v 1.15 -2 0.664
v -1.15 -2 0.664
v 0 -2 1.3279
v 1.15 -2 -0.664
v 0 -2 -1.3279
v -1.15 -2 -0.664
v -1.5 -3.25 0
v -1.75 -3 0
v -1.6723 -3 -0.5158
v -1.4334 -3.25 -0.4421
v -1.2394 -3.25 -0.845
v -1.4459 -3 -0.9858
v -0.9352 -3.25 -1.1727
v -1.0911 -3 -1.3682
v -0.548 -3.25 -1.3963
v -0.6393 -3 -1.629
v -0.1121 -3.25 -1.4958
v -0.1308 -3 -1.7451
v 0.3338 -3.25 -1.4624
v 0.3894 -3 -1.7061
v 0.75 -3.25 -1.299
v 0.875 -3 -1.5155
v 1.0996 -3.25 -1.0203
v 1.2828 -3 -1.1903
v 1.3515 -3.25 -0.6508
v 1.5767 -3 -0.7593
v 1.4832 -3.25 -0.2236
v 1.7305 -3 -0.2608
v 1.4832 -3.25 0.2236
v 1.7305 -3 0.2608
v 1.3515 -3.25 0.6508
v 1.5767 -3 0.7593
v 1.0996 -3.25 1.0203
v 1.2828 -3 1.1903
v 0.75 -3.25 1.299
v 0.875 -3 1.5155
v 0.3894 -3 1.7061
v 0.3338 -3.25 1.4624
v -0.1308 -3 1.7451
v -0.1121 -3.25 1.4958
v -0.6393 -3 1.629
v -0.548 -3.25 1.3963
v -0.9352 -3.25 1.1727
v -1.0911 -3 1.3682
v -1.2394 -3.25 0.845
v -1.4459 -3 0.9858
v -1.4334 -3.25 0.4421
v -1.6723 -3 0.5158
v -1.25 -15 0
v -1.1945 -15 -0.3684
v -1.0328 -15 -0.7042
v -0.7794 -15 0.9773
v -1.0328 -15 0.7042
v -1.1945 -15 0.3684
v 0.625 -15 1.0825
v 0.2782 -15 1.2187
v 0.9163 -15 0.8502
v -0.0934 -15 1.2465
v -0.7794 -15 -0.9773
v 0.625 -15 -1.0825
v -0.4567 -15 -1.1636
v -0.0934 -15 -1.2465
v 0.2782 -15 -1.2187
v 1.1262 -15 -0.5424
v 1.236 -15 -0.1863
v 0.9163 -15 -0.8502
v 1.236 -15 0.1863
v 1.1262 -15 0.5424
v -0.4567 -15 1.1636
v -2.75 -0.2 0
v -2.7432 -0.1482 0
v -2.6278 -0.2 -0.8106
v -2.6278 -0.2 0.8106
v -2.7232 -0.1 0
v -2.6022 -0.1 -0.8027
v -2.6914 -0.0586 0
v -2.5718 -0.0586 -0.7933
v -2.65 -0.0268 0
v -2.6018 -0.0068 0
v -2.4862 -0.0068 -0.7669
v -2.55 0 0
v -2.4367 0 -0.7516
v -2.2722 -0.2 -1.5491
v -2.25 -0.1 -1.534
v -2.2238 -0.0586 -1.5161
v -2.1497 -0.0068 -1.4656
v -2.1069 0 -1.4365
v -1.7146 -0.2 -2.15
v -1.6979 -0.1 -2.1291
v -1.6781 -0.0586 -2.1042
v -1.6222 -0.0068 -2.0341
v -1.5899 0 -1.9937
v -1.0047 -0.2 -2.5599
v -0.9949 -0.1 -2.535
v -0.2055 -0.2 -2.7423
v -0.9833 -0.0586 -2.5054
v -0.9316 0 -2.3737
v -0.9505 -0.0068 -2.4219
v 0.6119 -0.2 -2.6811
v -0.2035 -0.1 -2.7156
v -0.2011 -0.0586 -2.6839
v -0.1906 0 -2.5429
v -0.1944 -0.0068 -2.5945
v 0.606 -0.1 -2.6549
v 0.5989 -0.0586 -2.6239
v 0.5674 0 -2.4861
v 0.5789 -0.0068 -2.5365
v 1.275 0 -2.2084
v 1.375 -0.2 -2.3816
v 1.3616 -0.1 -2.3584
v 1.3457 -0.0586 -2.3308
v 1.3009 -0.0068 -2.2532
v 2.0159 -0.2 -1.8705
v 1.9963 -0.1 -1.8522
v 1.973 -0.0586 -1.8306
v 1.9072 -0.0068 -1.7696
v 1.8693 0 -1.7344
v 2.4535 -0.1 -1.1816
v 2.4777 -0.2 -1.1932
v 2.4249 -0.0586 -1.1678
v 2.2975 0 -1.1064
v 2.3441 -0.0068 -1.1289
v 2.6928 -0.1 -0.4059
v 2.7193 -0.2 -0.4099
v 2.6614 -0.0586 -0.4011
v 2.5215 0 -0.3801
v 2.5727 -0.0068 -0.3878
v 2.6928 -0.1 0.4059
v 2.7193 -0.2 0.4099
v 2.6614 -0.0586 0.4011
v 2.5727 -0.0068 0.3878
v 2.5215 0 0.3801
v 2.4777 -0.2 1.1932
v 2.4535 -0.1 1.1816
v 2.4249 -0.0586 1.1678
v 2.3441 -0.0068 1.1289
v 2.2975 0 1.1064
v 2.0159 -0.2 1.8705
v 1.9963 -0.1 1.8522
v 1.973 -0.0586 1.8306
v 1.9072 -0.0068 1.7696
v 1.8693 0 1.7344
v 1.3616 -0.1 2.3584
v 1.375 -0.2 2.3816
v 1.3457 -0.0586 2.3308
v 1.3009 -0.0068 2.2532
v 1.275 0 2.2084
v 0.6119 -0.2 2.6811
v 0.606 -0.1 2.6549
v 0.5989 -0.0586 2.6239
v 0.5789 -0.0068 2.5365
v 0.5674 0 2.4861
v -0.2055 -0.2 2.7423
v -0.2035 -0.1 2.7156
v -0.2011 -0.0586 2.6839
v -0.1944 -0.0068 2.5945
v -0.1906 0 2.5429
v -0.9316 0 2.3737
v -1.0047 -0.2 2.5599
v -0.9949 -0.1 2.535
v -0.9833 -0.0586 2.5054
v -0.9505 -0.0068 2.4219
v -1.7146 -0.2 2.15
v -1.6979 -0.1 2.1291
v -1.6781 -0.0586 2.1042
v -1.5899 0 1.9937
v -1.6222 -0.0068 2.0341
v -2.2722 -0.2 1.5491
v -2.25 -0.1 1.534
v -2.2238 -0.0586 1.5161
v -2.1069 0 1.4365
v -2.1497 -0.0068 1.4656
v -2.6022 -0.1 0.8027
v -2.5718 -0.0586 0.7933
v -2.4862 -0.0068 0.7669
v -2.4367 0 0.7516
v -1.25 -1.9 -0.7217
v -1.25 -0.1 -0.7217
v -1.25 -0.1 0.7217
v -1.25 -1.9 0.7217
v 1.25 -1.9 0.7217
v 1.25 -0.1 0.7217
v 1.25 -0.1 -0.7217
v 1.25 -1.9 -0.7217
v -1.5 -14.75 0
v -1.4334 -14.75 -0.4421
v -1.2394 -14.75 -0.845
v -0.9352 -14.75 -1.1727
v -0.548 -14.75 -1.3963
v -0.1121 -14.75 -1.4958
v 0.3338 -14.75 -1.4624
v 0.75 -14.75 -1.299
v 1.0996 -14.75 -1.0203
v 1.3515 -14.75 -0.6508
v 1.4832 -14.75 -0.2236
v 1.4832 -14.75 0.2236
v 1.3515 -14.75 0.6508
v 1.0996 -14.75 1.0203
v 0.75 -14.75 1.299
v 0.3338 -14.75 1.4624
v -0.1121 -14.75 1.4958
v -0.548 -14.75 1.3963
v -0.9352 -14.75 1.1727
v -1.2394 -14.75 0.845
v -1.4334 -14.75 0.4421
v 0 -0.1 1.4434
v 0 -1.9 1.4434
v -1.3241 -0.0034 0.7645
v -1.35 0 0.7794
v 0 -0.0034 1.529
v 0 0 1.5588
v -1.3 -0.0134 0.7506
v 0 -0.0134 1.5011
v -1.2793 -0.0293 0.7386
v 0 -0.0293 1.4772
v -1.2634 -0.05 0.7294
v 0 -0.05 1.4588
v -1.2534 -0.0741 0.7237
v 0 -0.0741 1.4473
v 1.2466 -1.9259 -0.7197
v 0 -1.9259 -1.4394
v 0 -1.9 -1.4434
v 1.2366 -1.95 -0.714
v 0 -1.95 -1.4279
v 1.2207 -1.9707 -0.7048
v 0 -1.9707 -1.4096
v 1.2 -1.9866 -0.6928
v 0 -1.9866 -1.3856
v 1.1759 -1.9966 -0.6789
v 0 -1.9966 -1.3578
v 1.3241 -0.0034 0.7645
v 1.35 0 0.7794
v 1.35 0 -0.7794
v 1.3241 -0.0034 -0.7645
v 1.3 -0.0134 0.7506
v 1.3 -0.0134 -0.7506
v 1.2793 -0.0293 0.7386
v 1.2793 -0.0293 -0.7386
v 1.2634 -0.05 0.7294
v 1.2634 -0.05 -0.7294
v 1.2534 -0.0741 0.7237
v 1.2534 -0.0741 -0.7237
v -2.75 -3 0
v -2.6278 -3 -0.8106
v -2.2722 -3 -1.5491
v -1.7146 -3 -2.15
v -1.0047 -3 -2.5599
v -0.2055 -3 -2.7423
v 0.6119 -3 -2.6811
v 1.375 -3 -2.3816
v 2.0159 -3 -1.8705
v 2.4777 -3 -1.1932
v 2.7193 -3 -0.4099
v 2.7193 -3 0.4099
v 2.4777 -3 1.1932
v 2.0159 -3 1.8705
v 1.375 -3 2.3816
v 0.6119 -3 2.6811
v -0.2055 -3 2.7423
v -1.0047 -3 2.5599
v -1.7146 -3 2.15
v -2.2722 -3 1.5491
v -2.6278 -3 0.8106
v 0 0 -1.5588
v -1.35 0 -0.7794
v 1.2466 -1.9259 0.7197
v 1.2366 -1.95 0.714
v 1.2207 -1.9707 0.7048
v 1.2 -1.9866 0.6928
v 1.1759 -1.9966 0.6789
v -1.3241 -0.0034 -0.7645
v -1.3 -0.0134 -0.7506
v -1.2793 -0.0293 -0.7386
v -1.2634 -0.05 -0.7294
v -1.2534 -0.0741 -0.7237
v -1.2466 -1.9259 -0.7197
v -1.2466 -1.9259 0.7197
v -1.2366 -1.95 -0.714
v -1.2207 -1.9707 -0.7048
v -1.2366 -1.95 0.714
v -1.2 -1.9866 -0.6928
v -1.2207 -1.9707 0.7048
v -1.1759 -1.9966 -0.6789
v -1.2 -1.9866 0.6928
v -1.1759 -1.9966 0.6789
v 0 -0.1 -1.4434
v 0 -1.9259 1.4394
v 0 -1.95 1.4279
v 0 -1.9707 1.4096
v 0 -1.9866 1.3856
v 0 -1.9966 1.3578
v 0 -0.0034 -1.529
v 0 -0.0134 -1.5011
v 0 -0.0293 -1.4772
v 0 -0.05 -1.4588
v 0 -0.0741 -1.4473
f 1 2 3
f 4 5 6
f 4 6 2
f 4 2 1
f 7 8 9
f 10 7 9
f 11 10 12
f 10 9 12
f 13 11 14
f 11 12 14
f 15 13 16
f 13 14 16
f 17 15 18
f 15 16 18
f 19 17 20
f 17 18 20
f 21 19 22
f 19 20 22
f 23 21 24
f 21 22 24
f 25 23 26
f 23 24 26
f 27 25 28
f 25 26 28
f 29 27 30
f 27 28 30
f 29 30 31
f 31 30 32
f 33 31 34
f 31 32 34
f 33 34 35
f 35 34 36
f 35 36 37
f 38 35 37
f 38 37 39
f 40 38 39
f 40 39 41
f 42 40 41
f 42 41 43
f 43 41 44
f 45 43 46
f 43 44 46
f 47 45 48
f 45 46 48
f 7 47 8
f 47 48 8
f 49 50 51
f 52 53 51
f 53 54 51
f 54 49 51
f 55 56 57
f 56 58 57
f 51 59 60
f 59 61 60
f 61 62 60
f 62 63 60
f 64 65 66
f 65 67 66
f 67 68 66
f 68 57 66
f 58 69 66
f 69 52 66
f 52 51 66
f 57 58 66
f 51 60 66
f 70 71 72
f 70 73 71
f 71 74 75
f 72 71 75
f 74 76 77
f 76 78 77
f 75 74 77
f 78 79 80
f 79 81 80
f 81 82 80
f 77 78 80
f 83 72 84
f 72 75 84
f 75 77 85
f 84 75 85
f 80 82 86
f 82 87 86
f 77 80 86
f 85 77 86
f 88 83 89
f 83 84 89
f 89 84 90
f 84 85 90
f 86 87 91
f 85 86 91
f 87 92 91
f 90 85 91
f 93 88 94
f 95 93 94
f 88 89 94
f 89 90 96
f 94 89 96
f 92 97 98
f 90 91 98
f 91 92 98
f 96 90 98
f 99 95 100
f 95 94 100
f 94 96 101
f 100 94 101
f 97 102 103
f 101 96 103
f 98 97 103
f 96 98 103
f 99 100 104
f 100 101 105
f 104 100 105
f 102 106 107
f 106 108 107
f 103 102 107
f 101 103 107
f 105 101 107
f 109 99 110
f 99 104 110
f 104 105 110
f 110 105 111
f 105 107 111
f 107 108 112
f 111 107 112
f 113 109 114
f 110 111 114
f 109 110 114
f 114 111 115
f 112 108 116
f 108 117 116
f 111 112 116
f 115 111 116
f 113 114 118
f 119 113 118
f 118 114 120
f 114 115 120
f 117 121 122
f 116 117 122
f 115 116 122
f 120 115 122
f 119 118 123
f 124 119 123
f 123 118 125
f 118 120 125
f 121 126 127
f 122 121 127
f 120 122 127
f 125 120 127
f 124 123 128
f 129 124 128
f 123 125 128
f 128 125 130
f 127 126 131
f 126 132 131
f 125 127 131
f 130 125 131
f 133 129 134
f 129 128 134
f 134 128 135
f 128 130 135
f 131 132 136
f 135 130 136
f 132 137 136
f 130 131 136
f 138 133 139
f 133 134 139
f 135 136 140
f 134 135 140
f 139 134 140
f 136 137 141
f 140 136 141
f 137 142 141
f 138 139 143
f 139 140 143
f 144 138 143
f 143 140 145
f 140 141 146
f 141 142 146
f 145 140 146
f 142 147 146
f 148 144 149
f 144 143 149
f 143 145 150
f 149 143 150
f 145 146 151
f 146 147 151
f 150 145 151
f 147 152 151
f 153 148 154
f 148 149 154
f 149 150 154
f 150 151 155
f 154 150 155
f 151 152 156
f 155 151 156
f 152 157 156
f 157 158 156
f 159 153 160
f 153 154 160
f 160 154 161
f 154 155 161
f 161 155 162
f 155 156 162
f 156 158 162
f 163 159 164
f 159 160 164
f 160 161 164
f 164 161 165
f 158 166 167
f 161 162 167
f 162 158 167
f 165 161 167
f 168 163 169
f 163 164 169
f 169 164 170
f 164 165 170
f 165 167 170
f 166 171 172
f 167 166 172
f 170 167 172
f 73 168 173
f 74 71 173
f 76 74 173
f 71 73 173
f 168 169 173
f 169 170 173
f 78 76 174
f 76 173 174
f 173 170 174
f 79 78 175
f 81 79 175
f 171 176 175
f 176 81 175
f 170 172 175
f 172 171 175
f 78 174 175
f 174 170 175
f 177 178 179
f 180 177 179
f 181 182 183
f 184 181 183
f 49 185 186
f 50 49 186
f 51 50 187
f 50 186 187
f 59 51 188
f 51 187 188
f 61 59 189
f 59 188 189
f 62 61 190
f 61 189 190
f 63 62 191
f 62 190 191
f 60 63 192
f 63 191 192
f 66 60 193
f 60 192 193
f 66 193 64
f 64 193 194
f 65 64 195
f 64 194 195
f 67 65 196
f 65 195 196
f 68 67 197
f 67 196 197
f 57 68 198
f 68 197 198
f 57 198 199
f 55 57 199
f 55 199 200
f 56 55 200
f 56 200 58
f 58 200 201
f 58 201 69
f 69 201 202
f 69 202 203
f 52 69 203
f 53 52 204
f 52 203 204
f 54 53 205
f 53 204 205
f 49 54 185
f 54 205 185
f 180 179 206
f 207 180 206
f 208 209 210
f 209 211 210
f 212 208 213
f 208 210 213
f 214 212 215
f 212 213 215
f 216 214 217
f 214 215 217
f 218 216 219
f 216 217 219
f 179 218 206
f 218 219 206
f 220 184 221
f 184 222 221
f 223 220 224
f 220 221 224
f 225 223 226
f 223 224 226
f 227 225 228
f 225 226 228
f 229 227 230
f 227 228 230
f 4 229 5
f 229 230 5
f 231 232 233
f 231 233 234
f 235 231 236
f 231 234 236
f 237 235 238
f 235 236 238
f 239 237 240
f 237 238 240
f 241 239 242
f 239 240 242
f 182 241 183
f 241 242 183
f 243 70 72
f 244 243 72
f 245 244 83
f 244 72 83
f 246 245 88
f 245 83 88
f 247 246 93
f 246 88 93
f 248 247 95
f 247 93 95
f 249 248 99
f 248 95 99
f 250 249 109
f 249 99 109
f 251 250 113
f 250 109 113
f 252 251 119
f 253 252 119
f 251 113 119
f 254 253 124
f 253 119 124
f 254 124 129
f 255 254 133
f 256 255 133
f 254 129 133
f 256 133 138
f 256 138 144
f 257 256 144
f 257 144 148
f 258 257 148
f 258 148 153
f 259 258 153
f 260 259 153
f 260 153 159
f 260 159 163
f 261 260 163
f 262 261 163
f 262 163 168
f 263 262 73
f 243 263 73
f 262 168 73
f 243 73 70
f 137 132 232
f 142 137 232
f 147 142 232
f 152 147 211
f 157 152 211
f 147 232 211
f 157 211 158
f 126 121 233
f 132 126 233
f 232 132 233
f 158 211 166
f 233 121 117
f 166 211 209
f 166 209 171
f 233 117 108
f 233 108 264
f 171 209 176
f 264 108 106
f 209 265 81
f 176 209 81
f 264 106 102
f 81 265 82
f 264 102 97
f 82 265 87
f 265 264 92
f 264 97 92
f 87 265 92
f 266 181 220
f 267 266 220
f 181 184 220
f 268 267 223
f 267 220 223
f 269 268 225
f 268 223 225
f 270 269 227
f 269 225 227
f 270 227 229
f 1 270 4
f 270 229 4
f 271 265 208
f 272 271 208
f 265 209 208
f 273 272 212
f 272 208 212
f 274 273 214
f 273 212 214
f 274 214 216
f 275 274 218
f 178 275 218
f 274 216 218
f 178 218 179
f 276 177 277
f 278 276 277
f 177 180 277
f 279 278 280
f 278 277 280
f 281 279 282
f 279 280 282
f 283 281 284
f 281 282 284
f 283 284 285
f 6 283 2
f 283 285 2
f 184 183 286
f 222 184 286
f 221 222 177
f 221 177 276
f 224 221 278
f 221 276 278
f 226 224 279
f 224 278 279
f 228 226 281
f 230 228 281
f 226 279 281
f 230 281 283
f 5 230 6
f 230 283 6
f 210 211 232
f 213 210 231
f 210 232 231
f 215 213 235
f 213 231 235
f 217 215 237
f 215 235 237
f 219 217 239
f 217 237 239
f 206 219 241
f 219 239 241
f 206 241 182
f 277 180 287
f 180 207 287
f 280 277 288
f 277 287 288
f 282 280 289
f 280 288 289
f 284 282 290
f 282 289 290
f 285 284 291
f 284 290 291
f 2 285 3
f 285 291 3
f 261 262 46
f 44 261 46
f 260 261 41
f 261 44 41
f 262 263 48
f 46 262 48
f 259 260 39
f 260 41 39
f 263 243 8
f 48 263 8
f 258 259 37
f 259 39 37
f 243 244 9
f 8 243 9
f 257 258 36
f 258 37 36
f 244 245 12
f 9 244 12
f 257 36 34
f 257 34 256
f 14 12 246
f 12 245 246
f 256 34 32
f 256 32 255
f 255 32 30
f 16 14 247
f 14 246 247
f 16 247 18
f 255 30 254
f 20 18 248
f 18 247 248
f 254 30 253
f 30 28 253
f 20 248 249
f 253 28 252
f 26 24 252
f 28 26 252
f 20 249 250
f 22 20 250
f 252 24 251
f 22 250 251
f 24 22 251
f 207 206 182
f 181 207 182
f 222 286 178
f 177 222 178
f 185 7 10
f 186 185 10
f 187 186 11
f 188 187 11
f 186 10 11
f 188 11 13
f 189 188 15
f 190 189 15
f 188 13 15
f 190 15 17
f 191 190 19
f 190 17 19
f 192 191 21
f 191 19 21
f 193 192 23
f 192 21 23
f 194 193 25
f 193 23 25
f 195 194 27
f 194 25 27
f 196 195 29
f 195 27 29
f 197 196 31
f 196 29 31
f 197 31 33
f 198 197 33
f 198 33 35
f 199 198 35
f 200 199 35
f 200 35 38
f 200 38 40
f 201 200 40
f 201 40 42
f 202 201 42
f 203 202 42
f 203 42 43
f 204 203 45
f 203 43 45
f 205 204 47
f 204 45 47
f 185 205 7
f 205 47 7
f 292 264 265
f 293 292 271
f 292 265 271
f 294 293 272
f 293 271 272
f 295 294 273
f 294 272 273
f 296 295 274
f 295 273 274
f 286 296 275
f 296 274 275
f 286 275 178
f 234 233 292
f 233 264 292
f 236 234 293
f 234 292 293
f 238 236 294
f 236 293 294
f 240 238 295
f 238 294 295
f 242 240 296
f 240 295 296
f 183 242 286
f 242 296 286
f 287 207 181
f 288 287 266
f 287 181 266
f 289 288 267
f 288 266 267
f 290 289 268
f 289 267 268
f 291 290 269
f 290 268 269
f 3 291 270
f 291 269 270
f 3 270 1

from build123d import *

# Parameters (mm, degrees)
CHAMFER1_SIZE      = 0.25
FILLET1_R          = 0.2
CUT_EXTRUDE1_DEPTH = 2
FILLET2_R          = 0.1


with BuildPart() as part:
    # Sketch1 → Revolve1 (revolve)
    with BuildSketch(Plane.XY):
        Polygon((0, -15), (-1.5, -15), (-1.5, -3), (-2.75, -3), (-2.75, 0), (0, 0), align=None)
    revolve(axis=Axis((0, 0, 0), (0, -1, 0)))

    # Chamfer1
    chamfer1_edges = [part.edges().sort_by_distance(p)[0] for p in [
        (1.5, -3, 0),
        (1.5, -15, 0),
    ]]
    chamfer(chamfer1_edges, length=CHAMFER1_SIZE)

    # Fillet1
    fillet1_edges = [part.edges().sort_by_distance(p)[0] for p in [
        (2.75, 0, 0),
    ]]
    fillet(fillet1_edges, radius=FILLET1_R)

    # Sketch2 → Cut-Extrude1 (cut)
    with BuildSketch(Plane(origin=(0, 0, 0), x_dir=(1, 0, 0), z_dir=(0, 1, 0))):
        Polygon((0, 1.443375673), (-1.25, 0.721687836), (-1.25, -0.721687836), (0, -1.443375673), (1.25, -0.721687836), (1.25, 0.721687836), align=None)
    extrude(amount=-CUT_EXTRUDE1_DEPTH, mode=Mode.SUBTRACT)

    # Fillet2
    fillet2_edges = [part.edges().sort_by_distance(p)[0] for p in [
        (0.625, -2, -1.082531755),
        (1.25, -2, 0),
        (0.625, -2, 1.082531755),
        (-0.625, -2, 1.082531755),
        (-1.25, -2, 0),
        (-0.625, -2, -1.082531755),
        (0.625, 0, -1.082531755),
        (-0.625, 0, -1.082531755),
        (-1.25, 0, 0),
        (-0.625, 0, 1.082531755),
        (0.625, 0, 1.082531755),
        (1.25, 0, 0),
    ]]
    fillet(fillet2_edges, radius=FILLET2_R)


solid = part.part
